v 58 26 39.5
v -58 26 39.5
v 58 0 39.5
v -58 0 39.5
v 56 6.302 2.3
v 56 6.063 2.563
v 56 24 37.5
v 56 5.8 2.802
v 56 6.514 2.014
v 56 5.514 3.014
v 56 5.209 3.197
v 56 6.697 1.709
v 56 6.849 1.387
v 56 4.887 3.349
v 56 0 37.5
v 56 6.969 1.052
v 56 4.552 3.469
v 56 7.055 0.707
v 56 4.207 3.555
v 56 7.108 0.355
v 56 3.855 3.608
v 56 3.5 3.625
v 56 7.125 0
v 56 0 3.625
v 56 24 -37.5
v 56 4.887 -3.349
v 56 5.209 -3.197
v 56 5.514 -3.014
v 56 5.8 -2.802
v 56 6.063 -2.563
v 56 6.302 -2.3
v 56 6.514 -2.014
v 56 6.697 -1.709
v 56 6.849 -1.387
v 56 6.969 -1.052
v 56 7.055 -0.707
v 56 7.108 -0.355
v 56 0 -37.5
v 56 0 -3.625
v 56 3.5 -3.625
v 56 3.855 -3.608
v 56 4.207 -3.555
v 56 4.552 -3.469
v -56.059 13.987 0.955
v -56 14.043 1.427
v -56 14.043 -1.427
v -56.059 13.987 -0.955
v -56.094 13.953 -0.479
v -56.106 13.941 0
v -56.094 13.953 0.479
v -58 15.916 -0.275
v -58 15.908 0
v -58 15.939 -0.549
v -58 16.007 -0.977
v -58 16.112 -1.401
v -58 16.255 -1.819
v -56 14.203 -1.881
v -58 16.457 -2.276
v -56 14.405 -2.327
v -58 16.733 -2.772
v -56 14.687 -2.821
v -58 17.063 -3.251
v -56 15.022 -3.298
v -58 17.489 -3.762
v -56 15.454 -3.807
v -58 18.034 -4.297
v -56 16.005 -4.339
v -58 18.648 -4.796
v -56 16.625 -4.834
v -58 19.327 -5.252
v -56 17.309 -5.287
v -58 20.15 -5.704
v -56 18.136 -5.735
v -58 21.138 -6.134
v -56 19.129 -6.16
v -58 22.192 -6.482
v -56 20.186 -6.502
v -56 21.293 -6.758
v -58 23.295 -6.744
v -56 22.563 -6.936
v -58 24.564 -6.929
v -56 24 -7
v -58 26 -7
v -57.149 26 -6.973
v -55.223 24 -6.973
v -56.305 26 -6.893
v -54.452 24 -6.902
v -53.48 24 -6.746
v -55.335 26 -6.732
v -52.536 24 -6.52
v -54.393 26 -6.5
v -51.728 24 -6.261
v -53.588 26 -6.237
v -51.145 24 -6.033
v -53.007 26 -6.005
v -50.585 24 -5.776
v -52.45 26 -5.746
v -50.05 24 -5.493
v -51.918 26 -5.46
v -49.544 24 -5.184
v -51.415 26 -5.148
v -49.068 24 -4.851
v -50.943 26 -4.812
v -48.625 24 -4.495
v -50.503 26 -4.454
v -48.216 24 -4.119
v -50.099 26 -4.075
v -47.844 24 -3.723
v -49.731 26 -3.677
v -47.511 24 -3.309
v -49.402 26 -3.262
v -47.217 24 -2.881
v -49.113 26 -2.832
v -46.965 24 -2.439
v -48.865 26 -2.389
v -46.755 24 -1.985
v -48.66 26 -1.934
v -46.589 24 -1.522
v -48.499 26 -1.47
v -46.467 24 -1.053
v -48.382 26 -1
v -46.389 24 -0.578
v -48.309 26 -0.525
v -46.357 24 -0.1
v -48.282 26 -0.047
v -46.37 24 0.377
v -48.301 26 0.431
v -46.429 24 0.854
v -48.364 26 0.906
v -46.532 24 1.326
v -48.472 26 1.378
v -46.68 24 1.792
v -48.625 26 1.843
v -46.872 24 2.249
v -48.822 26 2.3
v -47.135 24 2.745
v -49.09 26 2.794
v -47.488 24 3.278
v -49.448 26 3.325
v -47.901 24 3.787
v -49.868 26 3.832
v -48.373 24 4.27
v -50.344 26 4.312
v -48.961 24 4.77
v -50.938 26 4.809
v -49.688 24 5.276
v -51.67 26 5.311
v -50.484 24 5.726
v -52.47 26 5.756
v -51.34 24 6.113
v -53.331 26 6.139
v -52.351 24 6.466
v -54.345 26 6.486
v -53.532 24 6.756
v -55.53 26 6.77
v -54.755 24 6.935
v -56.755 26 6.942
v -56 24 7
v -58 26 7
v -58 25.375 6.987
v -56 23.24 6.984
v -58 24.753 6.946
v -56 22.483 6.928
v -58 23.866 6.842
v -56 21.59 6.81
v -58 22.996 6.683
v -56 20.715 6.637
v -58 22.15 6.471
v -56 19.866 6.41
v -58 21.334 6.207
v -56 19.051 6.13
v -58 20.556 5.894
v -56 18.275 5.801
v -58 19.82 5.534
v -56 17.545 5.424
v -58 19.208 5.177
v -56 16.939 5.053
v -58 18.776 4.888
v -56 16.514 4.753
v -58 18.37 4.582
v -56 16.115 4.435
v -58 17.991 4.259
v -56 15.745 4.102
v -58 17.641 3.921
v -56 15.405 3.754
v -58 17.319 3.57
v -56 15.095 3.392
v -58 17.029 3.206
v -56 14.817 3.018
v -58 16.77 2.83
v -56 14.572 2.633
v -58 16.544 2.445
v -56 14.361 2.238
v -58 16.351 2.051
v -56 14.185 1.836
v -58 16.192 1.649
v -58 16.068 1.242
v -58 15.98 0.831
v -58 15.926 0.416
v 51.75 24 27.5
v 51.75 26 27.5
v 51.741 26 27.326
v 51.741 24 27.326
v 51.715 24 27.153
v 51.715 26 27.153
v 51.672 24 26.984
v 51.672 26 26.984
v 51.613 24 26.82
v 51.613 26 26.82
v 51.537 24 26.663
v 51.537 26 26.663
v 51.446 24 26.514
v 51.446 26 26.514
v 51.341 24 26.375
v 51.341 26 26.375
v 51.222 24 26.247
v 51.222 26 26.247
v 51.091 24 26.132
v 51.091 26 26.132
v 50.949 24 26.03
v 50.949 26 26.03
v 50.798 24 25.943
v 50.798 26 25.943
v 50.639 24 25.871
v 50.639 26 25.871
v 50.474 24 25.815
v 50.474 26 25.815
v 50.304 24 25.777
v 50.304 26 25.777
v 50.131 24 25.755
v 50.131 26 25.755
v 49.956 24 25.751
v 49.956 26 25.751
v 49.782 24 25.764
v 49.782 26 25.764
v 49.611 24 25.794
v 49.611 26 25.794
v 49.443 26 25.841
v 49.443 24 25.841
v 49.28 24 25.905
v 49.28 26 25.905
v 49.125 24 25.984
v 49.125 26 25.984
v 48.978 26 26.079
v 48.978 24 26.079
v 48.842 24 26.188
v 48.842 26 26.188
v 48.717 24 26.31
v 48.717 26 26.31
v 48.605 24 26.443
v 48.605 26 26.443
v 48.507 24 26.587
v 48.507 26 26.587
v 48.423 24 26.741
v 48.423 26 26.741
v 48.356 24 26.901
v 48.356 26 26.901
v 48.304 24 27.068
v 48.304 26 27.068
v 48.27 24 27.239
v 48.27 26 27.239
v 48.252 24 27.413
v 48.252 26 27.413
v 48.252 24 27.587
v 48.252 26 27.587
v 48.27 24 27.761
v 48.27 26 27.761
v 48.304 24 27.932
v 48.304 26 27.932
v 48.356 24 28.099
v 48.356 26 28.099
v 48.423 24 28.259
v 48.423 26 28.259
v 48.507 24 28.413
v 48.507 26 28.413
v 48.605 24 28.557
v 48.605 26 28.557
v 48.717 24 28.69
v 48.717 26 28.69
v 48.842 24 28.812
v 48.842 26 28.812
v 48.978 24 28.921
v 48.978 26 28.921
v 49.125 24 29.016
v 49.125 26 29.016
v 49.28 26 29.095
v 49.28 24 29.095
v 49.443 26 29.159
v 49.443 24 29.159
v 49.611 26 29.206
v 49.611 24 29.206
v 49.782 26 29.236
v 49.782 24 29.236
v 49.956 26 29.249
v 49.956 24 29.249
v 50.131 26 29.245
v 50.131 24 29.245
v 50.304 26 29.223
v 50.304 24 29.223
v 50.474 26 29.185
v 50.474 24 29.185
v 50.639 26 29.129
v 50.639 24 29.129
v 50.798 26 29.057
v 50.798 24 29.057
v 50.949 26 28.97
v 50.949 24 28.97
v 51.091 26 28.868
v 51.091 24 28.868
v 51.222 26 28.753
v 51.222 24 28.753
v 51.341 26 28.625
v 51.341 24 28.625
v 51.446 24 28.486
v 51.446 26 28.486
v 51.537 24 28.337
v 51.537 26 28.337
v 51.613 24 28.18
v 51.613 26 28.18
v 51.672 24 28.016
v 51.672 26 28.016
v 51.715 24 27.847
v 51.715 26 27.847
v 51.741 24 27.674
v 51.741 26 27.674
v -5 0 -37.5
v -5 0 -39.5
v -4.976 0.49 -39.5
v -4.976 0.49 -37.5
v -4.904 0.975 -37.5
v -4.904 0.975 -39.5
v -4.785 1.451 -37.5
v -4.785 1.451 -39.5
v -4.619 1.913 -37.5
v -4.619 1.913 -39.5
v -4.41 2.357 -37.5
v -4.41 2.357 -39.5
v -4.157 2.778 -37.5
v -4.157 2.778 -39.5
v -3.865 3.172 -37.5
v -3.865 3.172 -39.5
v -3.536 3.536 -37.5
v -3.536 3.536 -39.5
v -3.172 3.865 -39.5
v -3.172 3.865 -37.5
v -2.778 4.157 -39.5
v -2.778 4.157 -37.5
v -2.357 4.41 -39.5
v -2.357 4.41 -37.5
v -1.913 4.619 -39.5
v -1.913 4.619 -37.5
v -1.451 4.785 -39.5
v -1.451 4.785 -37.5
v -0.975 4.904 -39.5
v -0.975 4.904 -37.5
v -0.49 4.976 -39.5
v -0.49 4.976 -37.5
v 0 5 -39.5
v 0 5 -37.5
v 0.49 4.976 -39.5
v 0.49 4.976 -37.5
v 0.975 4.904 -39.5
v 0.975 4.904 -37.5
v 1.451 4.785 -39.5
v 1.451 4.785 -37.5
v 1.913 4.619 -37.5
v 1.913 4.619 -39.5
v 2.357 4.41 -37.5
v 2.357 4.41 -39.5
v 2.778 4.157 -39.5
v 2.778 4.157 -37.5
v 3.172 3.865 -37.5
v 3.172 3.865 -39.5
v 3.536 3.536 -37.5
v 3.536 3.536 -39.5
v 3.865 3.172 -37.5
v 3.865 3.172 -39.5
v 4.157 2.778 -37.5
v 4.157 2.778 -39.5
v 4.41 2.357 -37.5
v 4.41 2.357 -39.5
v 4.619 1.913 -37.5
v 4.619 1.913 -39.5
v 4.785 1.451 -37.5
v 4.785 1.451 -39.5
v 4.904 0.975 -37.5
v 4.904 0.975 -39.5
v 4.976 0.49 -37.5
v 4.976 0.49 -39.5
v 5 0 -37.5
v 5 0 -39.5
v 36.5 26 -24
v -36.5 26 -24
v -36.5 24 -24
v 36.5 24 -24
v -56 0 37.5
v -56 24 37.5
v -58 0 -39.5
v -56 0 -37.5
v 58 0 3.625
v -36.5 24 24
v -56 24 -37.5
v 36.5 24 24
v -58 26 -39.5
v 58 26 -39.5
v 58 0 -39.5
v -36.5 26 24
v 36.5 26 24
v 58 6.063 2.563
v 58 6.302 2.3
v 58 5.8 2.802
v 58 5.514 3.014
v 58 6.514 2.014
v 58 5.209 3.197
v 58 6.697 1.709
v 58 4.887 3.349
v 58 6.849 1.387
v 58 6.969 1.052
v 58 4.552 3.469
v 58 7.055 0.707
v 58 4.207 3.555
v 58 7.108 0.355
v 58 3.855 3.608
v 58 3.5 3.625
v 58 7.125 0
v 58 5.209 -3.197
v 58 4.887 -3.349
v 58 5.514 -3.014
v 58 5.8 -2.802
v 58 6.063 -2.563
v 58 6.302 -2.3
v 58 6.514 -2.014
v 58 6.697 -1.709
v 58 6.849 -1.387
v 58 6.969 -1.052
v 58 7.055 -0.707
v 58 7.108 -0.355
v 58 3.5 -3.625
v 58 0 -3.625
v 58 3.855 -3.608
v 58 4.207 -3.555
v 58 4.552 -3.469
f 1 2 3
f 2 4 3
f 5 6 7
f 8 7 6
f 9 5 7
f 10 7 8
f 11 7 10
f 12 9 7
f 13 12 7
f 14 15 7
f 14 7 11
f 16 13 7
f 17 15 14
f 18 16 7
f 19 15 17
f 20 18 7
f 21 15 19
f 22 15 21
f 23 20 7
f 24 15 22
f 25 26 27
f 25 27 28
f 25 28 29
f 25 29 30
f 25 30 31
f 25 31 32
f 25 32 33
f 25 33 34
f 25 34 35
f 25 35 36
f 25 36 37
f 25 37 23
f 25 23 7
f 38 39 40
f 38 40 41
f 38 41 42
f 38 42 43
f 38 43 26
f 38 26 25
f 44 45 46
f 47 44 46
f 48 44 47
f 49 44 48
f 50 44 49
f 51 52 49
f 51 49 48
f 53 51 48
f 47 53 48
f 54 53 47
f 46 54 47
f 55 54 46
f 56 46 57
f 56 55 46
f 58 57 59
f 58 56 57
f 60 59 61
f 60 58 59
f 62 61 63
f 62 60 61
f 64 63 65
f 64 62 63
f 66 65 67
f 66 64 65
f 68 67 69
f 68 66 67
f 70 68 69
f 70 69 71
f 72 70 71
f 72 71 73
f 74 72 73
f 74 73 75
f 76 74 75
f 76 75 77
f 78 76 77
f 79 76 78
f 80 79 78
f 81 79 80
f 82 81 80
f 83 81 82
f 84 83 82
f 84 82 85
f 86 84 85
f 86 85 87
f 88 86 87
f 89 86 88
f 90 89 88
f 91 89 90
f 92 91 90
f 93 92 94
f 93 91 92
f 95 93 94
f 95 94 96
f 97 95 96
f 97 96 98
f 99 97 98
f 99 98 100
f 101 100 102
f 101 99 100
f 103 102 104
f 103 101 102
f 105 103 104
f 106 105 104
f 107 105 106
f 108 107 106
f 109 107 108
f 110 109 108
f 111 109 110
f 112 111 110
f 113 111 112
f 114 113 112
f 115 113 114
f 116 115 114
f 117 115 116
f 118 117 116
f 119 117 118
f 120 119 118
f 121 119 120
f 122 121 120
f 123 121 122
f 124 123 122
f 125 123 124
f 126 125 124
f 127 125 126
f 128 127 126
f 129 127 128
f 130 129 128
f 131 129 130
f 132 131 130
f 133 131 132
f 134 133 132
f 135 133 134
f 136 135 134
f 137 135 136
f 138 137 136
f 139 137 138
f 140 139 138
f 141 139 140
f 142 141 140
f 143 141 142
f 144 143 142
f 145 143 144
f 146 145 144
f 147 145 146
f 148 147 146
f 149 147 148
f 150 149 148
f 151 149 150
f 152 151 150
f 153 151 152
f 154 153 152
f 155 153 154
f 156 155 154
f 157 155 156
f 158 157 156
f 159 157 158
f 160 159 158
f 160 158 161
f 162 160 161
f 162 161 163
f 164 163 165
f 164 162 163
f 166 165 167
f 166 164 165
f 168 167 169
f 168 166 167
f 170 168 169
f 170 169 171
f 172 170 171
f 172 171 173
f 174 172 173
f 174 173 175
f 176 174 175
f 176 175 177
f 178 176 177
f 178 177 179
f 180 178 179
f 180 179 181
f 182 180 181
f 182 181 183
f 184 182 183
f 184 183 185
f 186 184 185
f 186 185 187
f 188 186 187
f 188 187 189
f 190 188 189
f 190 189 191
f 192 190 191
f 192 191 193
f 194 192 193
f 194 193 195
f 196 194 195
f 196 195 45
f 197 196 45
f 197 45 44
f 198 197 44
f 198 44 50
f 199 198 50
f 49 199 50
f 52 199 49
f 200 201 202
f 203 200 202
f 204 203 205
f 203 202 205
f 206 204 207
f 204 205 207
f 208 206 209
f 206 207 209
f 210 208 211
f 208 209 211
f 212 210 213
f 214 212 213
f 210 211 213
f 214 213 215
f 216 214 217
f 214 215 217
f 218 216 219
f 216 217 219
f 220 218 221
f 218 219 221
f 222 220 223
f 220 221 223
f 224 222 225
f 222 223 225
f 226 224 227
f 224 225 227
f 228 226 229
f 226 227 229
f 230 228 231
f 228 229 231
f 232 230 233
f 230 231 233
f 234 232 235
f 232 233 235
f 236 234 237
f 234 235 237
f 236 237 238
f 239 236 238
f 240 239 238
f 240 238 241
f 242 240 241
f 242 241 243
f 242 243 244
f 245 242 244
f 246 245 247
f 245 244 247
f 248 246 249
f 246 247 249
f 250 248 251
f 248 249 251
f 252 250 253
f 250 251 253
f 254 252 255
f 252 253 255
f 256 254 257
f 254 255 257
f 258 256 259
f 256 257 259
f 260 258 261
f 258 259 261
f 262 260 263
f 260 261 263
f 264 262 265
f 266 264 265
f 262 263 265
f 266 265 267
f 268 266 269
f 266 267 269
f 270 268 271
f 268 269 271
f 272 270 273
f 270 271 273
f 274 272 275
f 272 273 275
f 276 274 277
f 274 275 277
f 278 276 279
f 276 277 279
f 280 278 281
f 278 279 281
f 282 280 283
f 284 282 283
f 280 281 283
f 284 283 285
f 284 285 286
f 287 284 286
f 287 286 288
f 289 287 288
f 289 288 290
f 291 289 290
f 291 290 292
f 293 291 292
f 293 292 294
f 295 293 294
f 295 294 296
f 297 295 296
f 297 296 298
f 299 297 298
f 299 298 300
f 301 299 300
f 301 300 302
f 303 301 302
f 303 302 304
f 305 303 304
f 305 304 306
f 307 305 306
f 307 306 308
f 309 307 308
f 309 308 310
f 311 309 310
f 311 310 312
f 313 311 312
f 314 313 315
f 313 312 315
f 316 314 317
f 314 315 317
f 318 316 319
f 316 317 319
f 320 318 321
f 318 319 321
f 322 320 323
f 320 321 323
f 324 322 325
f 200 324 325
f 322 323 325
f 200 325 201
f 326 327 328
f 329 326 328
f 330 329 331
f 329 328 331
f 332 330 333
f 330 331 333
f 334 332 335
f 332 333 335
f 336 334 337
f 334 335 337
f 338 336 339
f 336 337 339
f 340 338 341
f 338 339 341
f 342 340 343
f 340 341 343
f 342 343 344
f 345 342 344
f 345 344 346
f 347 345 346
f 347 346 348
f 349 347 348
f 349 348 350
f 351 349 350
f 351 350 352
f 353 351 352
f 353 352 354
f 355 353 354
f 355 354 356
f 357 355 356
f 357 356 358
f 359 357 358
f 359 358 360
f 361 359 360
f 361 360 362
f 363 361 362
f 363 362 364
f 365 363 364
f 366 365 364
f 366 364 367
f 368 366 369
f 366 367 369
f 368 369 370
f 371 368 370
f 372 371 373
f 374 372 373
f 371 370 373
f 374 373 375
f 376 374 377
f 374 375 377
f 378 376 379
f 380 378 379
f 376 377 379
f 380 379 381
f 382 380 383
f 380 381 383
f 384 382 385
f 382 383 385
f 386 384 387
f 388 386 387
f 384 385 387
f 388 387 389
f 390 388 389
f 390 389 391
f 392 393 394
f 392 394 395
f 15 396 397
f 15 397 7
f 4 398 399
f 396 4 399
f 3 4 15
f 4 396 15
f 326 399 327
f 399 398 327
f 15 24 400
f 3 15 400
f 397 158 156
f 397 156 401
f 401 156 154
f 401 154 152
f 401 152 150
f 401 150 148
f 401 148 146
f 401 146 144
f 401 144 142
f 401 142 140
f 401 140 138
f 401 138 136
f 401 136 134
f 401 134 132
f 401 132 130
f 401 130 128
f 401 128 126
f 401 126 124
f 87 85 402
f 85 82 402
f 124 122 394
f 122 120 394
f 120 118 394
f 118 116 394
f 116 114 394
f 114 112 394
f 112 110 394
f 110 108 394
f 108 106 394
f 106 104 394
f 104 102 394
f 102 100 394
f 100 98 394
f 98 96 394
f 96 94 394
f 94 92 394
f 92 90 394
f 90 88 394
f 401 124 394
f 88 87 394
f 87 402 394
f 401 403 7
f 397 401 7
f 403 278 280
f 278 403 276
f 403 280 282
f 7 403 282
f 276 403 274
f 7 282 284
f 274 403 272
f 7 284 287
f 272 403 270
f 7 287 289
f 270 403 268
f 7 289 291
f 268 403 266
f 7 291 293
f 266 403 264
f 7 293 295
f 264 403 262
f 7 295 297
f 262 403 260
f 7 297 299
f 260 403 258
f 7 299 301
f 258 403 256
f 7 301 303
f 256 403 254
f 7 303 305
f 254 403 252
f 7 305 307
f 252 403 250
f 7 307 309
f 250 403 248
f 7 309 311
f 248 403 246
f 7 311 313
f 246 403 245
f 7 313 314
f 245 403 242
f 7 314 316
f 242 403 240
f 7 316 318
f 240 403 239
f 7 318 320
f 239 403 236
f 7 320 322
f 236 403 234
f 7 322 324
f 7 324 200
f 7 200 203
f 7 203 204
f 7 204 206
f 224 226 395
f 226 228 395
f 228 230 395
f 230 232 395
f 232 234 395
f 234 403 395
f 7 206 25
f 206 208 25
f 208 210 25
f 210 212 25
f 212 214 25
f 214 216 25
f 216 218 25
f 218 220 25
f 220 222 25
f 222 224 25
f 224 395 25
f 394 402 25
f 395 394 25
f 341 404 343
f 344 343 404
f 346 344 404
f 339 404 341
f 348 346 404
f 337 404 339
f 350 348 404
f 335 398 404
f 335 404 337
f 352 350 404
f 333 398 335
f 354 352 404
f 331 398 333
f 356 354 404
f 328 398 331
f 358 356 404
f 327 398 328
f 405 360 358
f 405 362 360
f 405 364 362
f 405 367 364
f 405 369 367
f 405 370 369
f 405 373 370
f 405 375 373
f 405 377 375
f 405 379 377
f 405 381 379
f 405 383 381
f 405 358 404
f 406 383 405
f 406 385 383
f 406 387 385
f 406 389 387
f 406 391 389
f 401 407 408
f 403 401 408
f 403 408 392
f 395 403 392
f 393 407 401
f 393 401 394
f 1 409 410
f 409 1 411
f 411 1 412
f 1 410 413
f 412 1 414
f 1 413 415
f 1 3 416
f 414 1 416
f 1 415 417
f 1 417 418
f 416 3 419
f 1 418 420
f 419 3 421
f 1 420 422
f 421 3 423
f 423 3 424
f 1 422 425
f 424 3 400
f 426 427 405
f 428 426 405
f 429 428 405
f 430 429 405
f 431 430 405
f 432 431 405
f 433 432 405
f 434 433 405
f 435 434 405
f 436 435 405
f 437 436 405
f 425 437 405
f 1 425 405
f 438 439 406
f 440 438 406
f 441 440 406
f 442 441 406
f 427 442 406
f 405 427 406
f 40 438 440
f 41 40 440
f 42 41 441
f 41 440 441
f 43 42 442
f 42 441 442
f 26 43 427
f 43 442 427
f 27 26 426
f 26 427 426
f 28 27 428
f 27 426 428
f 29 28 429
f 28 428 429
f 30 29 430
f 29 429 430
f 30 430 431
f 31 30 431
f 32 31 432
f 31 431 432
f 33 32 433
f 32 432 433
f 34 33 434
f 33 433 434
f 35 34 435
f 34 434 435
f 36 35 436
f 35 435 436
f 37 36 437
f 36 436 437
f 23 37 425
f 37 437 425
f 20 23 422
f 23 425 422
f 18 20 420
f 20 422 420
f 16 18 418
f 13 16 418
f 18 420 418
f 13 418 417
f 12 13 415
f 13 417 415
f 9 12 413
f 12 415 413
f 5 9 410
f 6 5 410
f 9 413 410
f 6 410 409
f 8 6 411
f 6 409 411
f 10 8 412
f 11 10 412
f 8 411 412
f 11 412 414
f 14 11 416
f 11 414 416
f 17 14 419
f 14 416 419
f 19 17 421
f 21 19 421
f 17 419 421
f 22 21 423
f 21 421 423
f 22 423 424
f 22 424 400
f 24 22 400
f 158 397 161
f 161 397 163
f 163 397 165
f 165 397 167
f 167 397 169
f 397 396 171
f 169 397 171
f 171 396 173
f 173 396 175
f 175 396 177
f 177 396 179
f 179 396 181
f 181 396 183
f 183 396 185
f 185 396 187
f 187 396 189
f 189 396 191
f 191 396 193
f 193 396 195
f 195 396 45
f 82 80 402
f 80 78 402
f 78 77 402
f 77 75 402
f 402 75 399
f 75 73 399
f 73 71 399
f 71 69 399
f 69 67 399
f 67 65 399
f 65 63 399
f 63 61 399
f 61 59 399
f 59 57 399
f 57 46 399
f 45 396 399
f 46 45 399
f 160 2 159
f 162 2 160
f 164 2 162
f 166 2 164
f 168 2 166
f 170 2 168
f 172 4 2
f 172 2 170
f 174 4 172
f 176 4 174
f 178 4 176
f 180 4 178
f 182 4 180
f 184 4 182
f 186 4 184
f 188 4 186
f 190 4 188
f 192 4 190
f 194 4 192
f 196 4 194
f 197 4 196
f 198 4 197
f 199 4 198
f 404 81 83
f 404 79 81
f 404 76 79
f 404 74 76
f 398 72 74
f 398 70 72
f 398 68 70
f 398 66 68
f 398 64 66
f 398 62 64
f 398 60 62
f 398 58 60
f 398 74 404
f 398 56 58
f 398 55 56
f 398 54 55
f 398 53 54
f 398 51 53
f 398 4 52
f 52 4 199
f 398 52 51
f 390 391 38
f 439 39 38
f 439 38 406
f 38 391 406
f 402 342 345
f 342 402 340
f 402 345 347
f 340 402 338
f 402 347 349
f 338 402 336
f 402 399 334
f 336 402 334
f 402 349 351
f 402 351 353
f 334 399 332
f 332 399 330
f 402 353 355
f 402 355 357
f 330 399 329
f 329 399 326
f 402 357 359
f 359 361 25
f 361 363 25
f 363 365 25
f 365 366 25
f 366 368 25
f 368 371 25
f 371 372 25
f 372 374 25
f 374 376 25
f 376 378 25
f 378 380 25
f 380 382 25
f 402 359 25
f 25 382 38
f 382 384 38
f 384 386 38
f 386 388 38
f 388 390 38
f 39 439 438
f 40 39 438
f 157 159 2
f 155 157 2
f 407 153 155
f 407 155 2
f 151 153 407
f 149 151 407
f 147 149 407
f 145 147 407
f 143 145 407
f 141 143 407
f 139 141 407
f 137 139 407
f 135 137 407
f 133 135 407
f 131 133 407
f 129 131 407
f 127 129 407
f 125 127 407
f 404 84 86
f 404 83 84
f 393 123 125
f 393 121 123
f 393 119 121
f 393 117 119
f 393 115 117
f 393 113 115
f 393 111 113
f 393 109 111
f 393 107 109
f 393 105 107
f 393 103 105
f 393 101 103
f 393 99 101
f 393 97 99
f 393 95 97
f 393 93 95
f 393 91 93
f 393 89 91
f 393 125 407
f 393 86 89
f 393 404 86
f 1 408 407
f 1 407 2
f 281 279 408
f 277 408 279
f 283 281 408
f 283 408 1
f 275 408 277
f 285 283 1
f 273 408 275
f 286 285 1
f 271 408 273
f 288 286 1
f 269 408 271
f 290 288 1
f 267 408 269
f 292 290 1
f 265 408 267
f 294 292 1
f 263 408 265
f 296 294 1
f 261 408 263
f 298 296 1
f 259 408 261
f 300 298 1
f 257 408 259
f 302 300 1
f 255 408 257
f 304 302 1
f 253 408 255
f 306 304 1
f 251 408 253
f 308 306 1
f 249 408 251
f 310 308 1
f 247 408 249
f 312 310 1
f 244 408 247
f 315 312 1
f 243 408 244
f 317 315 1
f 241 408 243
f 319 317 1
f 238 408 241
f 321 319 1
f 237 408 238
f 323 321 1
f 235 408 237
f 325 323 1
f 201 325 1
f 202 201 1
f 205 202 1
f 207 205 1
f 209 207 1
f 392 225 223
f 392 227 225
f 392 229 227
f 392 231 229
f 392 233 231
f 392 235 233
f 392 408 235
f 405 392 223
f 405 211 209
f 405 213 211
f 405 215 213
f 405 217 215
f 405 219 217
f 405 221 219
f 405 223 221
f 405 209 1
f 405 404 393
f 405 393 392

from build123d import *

# Parameters (mm, degrees)
SKETCH1_W           = 116
SKETCH1_H           = 79
SKETCH1_W_2         = 112
SKETCH1_H_2         = 75
BOSS_EXTRUDE1_DEPTH = 24
SKETCH2_W           = 116
SKETCH2_H           = 79
BOSS_EXTRUDE2_DEPTH = 2
SKETCH3_W           = 73
SKETCH3_H           = 48
CUT_EXTRUDE1_DEPTH  = 2
SKETCH4_R           = 1.75
CUT_EXTRUDE2_DEPTH  = 2
SKETCH6_R           = 7
CUT_EXTRUDE3_DEPTH  = 10
CUT_EXTRUDE4_DEPTH  = 2
SKETCH8_R           = 5
CUT_EXTRUDE5_DEPTH  = 2


with BuildPart() as part:
    # Sketch1 → Boss-Extrude1 (new body)
    with BuildSketch(Plane(origin=(0, 0, 0), x_dir=(1, 0, 0), z_dir=(0, 1, 0))):
        Rectangle(SKETCH1_W, SKETCH1_H)
        Rectangle(SKETCH1_W_2, SKETCH1_H_2, mode=Mode.SUBTRACT)
    extrude(amount=BOSS_EXTRUDE1_DEPTH)

    # Sketch2 → Boss-Extrude2 (add)
    with BuildSketch(Plane(origin=(0, 24, 0), x_dir=(1, 0, 0), z_dir=(0, 1, 0))):
        Rectangle(SKETCH2_W, SKETCH2_H)
    extrude(amount=BOSS_EXTRUDE2_DEPTH)

    # Sketch3 → Cut-Extrude1 (cut)
    with BuildSketch(Plane(origin=(0, 26, 0), x_dir=(1, 0, 0), z_dir=(0, 1, 0))):
        Rectangle(SKETCH3_W, SKETCH3_H)
    extrude(amount=-CUT_EXTRUDE1_DEPTH, mode=Mode.SUBTRACT)

    # Sketch4 → Cut-Extrude2 (cut)
    with BuildSketch(Plane(origin=(0, 26, 0), x_dir=(1, 0, 0), z_dir=(0, 1, 0))):
        with Locations((50, -27.5)):
            Circle(SKETCH4_R)
    extrude(amount=-CUT_EXTRUDE2_DEPTH, mode=Mode.SUBTRACT)

    # Sketch6 → Cut-Extrude3 (cut)
    with BuildSketch(Plane(origin=(-40.896797153, 42.46975089, 0), x_dir=(-0.720320213, -0.693641687, 0), z_dir=(0.693641687, -0.720320213, 0))):
        with Locations((23.743888519, 0)):
            Circle(SKETCH6_R)
    extrude(amount=CUT_EXTRUDE3_DEPTH, mode=Mode.SUBTRACT)

    # Sketch7 → Cut-Extrude4 (cut)
    with BuildSketch(Plane(origin=(58, 0, 0), x_dir=(0, 0, -1), z_dir=(1, 0, 0))):
        with BuildLine():
            Line((-3.625, 3.5), (-3.625, 0))
            Line((-3.625, 0), (3.625, 0))
            Line((3.625, 0), (3.625, 3.5))
            ThreePointArc((3.625, 3.5), (0, 7.125), (-3.625, 3.5))
        make_face()
    extrude(amount=-CUT_EXTRUDE4_DEPTH, mode=Mode.SUBTRACT)

    # Sketch8 → Cut-Extrude5 (cut)
    with BuildSketch(Plane(origin=(0, 0, -39.5), x_dir=(-1, 0, 0), z_dir=(0, 0, -1))):
        Circle(SKETCH8_R)
    extrude(amount=-CUT_EXTRUDE5_DEPTH, mode=Mode.SUBTRACT)


solid = part.part
